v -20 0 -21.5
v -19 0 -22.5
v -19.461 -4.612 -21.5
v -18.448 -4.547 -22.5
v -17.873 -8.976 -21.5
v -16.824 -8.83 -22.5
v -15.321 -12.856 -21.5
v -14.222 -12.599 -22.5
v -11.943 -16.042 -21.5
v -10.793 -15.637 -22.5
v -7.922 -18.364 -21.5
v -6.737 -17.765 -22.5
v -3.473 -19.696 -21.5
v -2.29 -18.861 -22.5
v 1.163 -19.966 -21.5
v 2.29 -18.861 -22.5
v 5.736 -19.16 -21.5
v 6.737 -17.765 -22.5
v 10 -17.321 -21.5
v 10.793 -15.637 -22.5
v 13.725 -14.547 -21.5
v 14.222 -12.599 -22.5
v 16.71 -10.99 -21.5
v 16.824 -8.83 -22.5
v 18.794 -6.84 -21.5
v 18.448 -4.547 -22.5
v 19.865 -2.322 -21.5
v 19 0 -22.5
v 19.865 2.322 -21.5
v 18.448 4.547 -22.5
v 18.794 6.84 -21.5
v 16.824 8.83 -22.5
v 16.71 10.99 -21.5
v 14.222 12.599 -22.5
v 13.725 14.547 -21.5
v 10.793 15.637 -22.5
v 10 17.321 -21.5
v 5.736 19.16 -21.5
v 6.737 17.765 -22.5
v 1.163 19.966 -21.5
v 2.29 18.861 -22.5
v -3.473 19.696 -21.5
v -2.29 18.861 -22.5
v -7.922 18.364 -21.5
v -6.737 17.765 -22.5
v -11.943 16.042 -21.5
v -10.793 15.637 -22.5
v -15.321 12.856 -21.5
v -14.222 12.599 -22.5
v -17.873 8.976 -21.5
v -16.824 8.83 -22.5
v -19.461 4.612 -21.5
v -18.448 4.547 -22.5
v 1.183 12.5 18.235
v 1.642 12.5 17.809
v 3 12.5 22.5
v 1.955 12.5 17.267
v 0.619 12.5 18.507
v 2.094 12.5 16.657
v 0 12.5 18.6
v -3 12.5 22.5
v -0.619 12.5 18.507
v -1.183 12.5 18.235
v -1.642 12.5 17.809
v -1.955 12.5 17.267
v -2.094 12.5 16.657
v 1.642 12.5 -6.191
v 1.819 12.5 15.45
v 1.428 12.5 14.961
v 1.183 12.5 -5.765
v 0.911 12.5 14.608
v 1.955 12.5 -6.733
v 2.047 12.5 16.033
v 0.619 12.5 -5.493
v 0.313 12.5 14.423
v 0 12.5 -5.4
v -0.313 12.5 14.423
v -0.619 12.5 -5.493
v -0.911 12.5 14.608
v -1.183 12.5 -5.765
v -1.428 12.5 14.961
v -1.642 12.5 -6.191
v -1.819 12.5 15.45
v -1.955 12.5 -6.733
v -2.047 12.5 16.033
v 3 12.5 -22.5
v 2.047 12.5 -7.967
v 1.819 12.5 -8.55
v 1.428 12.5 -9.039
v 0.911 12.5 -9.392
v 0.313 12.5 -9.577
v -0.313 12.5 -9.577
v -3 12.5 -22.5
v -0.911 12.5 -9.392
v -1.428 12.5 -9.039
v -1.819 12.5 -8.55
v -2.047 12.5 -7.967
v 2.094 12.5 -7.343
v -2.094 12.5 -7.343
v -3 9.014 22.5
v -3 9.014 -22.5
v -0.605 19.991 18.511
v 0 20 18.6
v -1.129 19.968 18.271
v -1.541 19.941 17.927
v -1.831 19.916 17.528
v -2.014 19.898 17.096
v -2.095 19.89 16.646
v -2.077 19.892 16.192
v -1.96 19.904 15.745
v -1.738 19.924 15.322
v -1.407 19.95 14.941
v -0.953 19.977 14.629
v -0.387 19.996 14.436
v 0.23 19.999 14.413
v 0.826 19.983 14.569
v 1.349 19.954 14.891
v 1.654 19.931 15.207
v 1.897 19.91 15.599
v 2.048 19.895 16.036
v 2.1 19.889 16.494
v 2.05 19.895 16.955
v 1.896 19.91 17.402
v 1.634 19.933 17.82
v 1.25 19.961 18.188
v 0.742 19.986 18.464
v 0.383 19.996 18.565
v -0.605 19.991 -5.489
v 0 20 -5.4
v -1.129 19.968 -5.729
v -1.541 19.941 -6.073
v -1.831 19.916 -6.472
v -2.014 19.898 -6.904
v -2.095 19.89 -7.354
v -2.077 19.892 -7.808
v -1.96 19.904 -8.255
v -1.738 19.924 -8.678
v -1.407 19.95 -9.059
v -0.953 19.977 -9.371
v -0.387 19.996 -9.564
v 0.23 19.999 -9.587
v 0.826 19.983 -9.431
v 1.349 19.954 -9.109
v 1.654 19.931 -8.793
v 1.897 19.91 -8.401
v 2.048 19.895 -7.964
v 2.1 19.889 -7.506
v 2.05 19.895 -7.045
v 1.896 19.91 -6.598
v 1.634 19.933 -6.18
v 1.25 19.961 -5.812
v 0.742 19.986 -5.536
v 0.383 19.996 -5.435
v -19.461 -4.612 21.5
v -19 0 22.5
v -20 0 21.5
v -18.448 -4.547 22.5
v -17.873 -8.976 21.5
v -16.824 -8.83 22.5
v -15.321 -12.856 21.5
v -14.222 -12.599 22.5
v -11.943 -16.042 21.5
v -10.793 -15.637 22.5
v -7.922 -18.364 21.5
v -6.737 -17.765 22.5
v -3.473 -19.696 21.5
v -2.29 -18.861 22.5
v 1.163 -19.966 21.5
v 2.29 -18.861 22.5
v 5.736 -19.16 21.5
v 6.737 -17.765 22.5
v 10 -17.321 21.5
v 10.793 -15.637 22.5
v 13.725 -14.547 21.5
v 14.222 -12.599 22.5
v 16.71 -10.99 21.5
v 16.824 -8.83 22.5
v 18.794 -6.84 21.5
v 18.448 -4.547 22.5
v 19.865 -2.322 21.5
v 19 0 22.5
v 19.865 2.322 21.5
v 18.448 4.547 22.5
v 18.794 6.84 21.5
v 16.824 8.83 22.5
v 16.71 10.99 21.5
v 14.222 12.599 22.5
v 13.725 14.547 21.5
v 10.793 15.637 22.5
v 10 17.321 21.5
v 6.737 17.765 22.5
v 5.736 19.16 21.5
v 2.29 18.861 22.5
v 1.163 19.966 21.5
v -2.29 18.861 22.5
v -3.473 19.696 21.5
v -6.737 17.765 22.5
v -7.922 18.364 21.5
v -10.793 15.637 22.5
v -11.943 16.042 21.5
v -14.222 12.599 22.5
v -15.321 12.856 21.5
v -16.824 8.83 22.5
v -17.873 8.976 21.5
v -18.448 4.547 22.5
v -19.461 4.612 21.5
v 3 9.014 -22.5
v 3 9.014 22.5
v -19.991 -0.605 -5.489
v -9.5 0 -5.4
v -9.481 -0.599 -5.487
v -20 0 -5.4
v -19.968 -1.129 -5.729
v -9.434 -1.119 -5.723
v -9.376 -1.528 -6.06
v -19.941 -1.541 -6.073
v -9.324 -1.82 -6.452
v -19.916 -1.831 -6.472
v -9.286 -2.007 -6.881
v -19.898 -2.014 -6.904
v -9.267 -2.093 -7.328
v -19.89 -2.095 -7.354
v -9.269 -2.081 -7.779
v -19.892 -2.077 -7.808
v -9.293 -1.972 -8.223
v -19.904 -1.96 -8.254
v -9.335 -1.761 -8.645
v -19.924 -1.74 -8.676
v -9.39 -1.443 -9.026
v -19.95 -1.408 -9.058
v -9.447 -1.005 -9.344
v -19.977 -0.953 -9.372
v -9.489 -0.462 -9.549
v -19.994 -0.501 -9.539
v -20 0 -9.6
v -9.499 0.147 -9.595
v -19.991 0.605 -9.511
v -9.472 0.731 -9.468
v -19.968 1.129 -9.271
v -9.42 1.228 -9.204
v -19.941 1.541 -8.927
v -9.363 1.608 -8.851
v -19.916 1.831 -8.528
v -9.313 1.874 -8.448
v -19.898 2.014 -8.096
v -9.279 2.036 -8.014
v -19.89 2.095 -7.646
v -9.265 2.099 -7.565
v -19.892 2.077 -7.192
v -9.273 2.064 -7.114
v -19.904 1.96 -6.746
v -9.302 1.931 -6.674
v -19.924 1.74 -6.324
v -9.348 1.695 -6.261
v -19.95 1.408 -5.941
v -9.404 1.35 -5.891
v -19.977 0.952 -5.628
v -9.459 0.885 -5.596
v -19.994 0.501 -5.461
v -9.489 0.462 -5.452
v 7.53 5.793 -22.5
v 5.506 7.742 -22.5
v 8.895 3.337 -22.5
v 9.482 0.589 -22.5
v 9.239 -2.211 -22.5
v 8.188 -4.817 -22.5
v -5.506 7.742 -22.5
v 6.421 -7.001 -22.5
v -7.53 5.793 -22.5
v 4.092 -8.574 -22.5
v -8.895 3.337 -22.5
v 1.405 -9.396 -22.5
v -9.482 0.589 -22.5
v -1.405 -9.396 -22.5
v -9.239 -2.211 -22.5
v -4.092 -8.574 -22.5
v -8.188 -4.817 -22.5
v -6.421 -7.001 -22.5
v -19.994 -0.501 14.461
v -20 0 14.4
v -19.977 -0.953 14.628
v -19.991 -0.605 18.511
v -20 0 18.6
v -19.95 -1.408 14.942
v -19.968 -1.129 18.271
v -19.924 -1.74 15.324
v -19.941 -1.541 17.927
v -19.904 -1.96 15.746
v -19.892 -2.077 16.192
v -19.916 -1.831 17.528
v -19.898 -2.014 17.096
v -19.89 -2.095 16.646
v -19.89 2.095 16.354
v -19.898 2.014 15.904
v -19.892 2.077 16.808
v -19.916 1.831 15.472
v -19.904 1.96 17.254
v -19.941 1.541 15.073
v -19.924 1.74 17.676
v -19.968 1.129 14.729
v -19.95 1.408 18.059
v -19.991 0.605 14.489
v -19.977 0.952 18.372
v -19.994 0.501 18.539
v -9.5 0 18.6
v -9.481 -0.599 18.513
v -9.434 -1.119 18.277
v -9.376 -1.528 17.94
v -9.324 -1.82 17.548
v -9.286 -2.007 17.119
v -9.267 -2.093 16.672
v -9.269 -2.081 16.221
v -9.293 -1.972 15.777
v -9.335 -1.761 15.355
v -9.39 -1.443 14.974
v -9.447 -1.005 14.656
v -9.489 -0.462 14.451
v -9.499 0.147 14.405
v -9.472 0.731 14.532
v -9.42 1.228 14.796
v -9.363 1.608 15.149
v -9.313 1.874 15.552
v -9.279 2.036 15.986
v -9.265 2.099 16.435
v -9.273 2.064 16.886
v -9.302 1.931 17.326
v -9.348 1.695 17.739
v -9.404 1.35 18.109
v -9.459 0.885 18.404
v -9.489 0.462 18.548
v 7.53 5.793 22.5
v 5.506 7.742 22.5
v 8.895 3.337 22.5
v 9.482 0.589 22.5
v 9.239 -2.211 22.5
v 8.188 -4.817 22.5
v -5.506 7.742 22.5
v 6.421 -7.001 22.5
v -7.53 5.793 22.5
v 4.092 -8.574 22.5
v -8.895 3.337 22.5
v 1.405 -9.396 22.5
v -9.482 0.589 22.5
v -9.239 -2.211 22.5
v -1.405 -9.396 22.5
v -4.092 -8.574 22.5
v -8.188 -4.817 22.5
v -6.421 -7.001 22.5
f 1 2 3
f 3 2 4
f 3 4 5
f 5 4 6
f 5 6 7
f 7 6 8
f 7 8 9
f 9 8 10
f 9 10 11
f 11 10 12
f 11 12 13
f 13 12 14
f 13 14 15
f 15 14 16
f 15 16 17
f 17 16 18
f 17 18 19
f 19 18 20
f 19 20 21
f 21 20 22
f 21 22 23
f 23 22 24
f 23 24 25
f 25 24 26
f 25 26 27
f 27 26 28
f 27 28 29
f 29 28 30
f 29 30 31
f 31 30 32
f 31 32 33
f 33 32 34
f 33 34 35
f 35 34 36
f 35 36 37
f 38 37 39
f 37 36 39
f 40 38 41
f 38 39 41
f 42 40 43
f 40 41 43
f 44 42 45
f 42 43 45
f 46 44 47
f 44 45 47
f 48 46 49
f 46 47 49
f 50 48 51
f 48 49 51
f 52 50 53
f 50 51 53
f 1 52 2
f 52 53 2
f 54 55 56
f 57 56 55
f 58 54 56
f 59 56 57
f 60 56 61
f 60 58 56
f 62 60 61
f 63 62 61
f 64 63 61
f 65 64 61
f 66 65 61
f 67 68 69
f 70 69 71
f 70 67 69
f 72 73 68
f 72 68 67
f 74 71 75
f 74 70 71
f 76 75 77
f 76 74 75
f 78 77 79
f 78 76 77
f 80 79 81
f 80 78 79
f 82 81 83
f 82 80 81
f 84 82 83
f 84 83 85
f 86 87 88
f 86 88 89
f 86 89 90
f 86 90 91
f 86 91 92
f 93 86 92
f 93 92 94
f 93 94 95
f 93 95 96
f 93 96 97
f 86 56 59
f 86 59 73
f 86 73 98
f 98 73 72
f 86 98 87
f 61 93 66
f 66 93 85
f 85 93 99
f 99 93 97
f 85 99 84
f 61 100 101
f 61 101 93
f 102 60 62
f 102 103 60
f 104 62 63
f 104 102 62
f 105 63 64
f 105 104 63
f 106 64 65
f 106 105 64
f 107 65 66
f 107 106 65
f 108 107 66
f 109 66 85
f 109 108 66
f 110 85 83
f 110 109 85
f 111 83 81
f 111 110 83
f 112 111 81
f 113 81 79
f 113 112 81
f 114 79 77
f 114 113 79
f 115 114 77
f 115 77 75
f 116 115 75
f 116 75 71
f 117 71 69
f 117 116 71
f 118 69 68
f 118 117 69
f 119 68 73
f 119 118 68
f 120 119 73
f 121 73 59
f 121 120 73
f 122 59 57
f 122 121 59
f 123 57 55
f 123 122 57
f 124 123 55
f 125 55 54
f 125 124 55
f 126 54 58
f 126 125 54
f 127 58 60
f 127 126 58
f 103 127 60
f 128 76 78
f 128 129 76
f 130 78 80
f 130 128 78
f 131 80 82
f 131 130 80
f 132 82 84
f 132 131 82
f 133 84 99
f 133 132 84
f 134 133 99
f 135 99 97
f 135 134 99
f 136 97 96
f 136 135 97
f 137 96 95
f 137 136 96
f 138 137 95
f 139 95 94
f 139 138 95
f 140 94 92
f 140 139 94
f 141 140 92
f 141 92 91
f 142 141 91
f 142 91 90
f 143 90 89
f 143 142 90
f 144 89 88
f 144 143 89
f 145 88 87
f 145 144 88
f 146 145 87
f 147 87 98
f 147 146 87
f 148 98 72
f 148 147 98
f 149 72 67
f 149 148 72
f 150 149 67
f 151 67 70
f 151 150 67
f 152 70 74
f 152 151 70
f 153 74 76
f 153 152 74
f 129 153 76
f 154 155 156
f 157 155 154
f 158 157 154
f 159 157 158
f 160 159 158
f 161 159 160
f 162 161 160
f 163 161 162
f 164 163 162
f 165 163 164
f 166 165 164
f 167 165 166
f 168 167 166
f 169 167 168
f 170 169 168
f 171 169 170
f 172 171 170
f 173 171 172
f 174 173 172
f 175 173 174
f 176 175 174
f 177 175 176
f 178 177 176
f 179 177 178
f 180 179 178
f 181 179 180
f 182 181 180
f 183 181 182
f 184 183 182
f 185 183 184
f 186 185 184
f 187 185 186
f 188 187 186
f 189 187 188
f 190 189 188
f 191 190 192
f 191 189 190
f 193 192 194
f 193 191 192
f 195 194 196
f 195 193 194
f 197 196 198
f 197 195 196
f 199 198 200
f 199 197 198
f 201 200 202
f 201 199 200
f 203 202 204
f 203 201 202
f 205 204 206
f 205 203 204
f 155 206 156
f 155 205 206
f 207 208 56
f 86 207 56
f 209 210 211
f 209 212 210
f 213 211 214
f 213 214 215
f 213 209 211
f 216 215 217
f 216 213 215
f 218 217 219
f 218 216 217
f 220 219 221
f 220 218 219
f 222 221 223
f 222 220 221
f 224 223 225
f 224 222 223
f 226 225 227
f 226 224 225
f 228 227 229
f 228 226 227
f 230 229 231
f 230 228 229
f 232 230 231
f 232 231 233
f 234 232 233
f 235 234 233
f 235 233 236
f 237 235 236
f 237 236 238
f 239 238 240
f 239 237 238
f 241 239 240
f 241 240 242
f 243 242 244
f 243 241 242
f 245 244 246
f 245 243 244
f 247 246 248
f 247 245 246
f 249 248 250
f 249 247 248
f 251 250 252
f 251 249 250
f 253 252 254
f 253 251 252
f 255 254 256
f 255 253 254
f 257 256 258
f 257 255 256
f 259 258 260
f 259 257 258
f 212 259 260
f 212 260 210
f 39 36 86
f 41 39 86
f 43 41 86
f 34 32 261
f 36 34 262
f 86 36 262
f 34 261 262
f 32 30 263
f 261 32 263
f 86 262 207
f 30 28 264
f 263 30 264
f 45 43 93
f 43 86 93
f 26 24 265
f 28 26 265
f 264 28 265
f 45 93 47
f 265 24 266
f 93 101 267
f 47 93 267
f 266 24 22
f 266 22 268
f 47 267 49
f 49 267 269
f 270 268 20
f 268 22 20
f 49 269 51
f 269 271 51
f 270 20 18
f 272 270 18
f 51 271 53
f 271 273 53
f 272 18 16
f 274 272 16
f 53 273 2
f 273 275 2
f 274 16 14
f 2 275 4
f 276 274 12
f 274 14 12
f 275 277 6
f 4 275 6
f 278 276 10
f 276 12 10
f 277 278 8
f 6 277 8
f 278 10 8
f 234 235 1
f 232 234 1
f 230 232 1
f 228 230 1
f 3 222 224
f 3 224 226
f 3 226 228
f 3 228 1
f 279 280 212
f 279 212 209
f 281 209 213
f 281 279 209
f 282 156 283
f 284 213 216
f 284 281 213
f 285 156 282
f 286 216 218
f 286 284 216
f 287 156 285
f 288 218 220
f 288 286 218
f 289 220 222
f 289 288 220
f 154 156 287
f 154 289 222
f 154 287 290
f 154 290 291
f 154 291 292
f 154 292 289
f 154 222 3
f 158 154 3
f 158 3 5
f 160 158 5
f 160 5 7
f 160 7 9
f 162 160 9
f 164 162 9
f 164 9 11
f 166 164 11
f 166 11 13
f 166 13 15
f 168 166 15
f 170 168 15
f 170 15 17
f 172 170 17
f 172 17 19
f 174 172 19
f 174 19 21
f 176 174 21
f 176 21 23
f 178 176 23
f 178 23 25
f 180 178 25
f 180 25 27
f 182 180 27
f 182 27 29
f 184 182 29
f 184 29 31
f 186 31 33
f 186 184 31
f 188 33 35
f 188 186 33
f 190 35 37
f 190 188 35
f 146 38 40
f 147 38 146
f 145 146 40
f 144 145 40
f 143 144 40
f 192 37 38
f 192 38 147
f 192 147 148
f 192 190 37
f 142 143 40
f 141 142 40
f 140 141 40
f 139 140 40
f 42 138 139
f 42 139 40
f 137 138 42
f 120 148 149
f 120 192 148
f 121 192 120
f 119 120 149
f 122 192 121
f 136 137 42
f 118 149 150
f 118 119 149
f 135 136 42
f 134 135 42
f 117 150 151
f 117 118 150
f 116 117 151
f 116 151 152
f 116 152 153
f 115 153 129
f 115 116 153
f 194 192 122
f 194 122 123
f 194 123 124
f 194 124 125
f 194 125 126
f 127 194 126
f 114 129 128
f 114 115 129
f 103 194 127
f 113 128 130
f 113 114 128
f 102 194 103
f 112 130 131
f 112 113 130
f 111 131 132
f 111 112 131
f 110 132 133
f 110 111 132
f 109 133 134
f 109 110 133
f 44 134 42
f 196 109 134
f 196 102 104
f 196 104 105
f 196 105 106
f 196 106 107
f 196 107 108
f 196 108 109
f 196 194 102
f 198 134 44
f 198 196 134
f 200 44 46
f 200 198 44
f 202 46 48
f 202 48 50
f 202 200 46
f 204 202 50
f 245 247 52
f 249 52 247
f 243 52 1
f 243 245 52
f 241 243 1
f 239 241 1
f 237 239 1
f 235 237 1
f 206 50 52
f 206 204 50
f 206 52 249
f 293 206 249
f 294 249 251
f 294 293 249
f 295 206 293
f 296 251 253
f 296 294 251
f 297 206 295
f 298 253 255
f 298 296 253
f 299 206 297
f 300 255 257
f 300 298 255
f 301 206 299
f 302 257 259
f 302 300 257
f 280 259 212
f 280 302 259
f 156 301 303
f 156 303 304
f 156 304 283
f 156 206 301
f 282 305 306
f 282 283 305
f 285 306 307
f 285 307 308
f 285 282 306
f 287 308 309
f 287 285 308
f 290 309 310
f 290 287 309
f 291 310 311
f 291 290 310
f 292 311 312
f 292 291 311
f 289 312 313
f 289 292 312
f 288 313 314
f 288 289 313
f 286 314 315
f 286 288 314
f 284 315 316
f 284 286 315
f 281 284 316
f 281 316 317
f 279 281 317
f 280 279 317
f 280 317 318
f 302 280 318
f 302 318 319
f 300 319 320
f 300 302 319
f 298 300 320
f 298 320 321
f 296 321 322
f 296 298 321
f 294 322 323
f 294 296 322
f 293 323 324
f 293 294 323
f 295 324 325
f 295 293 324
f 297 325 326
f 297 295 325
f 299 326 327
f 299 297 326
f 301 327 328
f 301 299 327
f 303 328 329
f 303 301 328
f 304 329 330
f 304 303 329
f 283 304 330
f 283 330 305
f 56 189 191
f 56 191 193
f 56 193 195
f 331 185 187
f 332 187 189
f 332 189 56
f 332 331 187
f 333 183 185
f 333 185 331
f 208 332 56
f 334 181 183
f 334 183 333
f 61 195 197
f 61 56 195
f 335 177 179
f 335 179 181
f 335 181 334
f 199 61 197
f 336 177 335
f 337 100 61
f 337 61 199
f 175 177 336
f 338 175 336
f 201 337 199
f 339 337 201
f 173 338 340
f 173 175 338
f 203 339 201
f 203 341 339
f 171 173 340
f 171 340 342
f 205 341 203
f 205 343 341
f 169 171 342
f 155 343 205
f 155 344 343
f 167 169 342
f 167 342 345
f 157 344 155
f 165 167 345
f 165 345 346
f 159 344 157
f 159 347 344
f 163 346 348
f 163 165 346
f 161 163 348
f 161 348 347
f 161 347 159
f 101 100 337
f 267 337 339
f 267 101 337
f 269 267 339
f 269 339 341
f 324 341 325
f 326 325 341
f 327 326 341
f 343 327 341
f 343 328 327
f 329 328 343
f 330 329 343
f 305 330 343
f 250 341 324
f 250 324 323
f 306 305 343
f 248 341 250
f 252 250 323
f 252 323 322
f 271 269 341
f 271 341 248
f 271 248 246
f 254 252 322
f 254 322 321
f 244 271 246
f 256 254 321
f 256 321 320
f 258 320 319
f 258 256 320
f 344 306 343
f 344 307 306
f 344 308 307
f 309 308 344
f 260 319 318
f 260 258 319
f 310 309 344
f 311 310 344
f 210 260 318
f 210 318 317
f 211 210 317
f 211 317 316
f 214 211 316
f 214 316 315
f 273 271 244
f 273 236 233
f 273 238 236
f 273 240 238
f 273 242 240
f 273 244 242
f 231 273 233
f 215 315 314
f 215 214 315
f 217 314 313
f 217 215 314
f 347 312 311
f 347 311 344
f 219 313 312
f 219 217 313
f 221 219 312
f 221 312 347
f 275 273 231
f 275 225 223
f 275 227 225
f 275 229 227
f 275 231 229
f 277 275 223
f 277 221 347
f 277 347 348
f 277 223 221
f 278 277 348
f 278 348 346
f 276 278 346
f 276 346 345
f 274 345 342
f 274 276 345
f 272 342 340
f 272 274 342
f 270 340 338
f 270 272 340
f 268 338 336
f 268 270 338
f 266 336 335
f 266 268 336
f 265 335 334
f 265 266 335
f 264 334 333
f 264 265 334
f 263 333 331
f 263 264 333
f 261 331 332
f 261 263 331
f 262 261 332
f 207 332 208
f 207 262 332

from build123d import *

# Parameters (mm, degrees)
SKETCH_1_R                  = 20
SKETCH_1_R_2                = 9.5
EXTRUDE_1_DEPTH             = 22.5
SKETCH_3_W                  = 6
SKETCH_3_H                  = 6
CUT_EXTRUDE_2_DEPTH         = 54.150729064
HOLE_WIZARD_M5_1_AT_2_COUNT = 2
HOLE_WIZARD_M5_1_AT_2_PITCH = 24
PATTERN_CIRCULAR_1_COUNT    = 2
PATTERN_CIRCULAR_1_ANGLE    = 90
CHAMFER_1_SIZE              = 1


with BuildPart() as part:
    # 草图1 → 凸台-拉伸1 (new, symmetric)
    with BuildSketch(Plane.XY):
        with Locations(Location((0, 0, 0), (0, 0, 180))):
            Circle(SKETCH_1_R)
        with Locations(Location((0, 0, 0), (0, 0, 180))):
            Circle(SKETCH_1_R_2, mode=Mode.SUBTRACT)
    extrude(amount=EXTRUDE_1_DEPTH, both=True)

    # 草图3 → 切除-拉伸2 (cut, through all)
    with BuildSketch(Plane(origin=(0, 0, -22.5), x_dir=(-1, 0, 0), z_dir=(0, 0, -1))):
        with Locations((0, 9.5)):
            Rectangle(SKETCH_3_W, SKETCH_3_H)
    extrude(amount=-CUT_EXTRUDE_2_DEPTH, mode=Mode.SUBTRACT)

    # 草图4 → M5 螺纹孔1 (revolve, cut)
    with BuildSketch(Plane(origin=(-20, 0, 16.5), x_dir=(0, 0, 1), z_dir=(0, 1, 0))):
        Polygon((0, 0), (0, 20.2618073), (2.1, 19), (2.1, 0), align=None)
    hole_wizard_m5_1 = revolve(axis=Axis((-26.35, 0, 16.5), (1, 0, 0)), mode=Mode.SUBTRACT)

    # M5 螺纹孔1 at 2: M5 螺纹孔1 ×2
    with Locations(*[(0, 0, -i * HOLE_WIZARD_M5_1_AT_2_PITCH) for i in range(1, HOLE_WIZARD_M5_1_AT_2_COUNT)]):
        add(hole_wizard_m5_1, mode=Mode.SUBTRACT)

    # 阵列(圆周)1: M5 螺纹孔1 ×2 about axis
    pattern_circular_1_axis = Axis((0, 0, 22.5), (0, 0, -1))
    for i in range(1, PATTERN_CIRCULAR_1_COUNT):
        add(hole_wizard_m5_1.rotate(pattern_circular_1_axis, i * PATTERN_CIRCULAR_1_ANGLE / (PATTERN_CIRCULAR_1_COUNT - 1)), mode=Mode.SUBTRACT)

    # 阵列(圆周)1 copy 1 sketch → 阵列(圆周)1 copy 1 (revolve, cut)
    with BuildSketch(Plane(origin=(0, 20, -7.5), x_dir=(0, 0, 1), z_dir=(1, 0, 0))):
        Polygon((0, 0), (0, 20.2618073), (2.1, 19), (2.1, 0), align=None)
    revolve(axis=Axis((0, 26.35, -7.5), (0, -1, 0)), mode=Mode.SUBTRACT)

    # 倒角1
    chamfer_1_edges = [part.edges().sort_by_distance(p)[0] for p in [
        (20, 0, -22.5),
        (20, 0, 22.5),
    ]]
    chamfer(chamfer_1_edges, length=CHAMFER_1_SIZE)


solid = part.part
